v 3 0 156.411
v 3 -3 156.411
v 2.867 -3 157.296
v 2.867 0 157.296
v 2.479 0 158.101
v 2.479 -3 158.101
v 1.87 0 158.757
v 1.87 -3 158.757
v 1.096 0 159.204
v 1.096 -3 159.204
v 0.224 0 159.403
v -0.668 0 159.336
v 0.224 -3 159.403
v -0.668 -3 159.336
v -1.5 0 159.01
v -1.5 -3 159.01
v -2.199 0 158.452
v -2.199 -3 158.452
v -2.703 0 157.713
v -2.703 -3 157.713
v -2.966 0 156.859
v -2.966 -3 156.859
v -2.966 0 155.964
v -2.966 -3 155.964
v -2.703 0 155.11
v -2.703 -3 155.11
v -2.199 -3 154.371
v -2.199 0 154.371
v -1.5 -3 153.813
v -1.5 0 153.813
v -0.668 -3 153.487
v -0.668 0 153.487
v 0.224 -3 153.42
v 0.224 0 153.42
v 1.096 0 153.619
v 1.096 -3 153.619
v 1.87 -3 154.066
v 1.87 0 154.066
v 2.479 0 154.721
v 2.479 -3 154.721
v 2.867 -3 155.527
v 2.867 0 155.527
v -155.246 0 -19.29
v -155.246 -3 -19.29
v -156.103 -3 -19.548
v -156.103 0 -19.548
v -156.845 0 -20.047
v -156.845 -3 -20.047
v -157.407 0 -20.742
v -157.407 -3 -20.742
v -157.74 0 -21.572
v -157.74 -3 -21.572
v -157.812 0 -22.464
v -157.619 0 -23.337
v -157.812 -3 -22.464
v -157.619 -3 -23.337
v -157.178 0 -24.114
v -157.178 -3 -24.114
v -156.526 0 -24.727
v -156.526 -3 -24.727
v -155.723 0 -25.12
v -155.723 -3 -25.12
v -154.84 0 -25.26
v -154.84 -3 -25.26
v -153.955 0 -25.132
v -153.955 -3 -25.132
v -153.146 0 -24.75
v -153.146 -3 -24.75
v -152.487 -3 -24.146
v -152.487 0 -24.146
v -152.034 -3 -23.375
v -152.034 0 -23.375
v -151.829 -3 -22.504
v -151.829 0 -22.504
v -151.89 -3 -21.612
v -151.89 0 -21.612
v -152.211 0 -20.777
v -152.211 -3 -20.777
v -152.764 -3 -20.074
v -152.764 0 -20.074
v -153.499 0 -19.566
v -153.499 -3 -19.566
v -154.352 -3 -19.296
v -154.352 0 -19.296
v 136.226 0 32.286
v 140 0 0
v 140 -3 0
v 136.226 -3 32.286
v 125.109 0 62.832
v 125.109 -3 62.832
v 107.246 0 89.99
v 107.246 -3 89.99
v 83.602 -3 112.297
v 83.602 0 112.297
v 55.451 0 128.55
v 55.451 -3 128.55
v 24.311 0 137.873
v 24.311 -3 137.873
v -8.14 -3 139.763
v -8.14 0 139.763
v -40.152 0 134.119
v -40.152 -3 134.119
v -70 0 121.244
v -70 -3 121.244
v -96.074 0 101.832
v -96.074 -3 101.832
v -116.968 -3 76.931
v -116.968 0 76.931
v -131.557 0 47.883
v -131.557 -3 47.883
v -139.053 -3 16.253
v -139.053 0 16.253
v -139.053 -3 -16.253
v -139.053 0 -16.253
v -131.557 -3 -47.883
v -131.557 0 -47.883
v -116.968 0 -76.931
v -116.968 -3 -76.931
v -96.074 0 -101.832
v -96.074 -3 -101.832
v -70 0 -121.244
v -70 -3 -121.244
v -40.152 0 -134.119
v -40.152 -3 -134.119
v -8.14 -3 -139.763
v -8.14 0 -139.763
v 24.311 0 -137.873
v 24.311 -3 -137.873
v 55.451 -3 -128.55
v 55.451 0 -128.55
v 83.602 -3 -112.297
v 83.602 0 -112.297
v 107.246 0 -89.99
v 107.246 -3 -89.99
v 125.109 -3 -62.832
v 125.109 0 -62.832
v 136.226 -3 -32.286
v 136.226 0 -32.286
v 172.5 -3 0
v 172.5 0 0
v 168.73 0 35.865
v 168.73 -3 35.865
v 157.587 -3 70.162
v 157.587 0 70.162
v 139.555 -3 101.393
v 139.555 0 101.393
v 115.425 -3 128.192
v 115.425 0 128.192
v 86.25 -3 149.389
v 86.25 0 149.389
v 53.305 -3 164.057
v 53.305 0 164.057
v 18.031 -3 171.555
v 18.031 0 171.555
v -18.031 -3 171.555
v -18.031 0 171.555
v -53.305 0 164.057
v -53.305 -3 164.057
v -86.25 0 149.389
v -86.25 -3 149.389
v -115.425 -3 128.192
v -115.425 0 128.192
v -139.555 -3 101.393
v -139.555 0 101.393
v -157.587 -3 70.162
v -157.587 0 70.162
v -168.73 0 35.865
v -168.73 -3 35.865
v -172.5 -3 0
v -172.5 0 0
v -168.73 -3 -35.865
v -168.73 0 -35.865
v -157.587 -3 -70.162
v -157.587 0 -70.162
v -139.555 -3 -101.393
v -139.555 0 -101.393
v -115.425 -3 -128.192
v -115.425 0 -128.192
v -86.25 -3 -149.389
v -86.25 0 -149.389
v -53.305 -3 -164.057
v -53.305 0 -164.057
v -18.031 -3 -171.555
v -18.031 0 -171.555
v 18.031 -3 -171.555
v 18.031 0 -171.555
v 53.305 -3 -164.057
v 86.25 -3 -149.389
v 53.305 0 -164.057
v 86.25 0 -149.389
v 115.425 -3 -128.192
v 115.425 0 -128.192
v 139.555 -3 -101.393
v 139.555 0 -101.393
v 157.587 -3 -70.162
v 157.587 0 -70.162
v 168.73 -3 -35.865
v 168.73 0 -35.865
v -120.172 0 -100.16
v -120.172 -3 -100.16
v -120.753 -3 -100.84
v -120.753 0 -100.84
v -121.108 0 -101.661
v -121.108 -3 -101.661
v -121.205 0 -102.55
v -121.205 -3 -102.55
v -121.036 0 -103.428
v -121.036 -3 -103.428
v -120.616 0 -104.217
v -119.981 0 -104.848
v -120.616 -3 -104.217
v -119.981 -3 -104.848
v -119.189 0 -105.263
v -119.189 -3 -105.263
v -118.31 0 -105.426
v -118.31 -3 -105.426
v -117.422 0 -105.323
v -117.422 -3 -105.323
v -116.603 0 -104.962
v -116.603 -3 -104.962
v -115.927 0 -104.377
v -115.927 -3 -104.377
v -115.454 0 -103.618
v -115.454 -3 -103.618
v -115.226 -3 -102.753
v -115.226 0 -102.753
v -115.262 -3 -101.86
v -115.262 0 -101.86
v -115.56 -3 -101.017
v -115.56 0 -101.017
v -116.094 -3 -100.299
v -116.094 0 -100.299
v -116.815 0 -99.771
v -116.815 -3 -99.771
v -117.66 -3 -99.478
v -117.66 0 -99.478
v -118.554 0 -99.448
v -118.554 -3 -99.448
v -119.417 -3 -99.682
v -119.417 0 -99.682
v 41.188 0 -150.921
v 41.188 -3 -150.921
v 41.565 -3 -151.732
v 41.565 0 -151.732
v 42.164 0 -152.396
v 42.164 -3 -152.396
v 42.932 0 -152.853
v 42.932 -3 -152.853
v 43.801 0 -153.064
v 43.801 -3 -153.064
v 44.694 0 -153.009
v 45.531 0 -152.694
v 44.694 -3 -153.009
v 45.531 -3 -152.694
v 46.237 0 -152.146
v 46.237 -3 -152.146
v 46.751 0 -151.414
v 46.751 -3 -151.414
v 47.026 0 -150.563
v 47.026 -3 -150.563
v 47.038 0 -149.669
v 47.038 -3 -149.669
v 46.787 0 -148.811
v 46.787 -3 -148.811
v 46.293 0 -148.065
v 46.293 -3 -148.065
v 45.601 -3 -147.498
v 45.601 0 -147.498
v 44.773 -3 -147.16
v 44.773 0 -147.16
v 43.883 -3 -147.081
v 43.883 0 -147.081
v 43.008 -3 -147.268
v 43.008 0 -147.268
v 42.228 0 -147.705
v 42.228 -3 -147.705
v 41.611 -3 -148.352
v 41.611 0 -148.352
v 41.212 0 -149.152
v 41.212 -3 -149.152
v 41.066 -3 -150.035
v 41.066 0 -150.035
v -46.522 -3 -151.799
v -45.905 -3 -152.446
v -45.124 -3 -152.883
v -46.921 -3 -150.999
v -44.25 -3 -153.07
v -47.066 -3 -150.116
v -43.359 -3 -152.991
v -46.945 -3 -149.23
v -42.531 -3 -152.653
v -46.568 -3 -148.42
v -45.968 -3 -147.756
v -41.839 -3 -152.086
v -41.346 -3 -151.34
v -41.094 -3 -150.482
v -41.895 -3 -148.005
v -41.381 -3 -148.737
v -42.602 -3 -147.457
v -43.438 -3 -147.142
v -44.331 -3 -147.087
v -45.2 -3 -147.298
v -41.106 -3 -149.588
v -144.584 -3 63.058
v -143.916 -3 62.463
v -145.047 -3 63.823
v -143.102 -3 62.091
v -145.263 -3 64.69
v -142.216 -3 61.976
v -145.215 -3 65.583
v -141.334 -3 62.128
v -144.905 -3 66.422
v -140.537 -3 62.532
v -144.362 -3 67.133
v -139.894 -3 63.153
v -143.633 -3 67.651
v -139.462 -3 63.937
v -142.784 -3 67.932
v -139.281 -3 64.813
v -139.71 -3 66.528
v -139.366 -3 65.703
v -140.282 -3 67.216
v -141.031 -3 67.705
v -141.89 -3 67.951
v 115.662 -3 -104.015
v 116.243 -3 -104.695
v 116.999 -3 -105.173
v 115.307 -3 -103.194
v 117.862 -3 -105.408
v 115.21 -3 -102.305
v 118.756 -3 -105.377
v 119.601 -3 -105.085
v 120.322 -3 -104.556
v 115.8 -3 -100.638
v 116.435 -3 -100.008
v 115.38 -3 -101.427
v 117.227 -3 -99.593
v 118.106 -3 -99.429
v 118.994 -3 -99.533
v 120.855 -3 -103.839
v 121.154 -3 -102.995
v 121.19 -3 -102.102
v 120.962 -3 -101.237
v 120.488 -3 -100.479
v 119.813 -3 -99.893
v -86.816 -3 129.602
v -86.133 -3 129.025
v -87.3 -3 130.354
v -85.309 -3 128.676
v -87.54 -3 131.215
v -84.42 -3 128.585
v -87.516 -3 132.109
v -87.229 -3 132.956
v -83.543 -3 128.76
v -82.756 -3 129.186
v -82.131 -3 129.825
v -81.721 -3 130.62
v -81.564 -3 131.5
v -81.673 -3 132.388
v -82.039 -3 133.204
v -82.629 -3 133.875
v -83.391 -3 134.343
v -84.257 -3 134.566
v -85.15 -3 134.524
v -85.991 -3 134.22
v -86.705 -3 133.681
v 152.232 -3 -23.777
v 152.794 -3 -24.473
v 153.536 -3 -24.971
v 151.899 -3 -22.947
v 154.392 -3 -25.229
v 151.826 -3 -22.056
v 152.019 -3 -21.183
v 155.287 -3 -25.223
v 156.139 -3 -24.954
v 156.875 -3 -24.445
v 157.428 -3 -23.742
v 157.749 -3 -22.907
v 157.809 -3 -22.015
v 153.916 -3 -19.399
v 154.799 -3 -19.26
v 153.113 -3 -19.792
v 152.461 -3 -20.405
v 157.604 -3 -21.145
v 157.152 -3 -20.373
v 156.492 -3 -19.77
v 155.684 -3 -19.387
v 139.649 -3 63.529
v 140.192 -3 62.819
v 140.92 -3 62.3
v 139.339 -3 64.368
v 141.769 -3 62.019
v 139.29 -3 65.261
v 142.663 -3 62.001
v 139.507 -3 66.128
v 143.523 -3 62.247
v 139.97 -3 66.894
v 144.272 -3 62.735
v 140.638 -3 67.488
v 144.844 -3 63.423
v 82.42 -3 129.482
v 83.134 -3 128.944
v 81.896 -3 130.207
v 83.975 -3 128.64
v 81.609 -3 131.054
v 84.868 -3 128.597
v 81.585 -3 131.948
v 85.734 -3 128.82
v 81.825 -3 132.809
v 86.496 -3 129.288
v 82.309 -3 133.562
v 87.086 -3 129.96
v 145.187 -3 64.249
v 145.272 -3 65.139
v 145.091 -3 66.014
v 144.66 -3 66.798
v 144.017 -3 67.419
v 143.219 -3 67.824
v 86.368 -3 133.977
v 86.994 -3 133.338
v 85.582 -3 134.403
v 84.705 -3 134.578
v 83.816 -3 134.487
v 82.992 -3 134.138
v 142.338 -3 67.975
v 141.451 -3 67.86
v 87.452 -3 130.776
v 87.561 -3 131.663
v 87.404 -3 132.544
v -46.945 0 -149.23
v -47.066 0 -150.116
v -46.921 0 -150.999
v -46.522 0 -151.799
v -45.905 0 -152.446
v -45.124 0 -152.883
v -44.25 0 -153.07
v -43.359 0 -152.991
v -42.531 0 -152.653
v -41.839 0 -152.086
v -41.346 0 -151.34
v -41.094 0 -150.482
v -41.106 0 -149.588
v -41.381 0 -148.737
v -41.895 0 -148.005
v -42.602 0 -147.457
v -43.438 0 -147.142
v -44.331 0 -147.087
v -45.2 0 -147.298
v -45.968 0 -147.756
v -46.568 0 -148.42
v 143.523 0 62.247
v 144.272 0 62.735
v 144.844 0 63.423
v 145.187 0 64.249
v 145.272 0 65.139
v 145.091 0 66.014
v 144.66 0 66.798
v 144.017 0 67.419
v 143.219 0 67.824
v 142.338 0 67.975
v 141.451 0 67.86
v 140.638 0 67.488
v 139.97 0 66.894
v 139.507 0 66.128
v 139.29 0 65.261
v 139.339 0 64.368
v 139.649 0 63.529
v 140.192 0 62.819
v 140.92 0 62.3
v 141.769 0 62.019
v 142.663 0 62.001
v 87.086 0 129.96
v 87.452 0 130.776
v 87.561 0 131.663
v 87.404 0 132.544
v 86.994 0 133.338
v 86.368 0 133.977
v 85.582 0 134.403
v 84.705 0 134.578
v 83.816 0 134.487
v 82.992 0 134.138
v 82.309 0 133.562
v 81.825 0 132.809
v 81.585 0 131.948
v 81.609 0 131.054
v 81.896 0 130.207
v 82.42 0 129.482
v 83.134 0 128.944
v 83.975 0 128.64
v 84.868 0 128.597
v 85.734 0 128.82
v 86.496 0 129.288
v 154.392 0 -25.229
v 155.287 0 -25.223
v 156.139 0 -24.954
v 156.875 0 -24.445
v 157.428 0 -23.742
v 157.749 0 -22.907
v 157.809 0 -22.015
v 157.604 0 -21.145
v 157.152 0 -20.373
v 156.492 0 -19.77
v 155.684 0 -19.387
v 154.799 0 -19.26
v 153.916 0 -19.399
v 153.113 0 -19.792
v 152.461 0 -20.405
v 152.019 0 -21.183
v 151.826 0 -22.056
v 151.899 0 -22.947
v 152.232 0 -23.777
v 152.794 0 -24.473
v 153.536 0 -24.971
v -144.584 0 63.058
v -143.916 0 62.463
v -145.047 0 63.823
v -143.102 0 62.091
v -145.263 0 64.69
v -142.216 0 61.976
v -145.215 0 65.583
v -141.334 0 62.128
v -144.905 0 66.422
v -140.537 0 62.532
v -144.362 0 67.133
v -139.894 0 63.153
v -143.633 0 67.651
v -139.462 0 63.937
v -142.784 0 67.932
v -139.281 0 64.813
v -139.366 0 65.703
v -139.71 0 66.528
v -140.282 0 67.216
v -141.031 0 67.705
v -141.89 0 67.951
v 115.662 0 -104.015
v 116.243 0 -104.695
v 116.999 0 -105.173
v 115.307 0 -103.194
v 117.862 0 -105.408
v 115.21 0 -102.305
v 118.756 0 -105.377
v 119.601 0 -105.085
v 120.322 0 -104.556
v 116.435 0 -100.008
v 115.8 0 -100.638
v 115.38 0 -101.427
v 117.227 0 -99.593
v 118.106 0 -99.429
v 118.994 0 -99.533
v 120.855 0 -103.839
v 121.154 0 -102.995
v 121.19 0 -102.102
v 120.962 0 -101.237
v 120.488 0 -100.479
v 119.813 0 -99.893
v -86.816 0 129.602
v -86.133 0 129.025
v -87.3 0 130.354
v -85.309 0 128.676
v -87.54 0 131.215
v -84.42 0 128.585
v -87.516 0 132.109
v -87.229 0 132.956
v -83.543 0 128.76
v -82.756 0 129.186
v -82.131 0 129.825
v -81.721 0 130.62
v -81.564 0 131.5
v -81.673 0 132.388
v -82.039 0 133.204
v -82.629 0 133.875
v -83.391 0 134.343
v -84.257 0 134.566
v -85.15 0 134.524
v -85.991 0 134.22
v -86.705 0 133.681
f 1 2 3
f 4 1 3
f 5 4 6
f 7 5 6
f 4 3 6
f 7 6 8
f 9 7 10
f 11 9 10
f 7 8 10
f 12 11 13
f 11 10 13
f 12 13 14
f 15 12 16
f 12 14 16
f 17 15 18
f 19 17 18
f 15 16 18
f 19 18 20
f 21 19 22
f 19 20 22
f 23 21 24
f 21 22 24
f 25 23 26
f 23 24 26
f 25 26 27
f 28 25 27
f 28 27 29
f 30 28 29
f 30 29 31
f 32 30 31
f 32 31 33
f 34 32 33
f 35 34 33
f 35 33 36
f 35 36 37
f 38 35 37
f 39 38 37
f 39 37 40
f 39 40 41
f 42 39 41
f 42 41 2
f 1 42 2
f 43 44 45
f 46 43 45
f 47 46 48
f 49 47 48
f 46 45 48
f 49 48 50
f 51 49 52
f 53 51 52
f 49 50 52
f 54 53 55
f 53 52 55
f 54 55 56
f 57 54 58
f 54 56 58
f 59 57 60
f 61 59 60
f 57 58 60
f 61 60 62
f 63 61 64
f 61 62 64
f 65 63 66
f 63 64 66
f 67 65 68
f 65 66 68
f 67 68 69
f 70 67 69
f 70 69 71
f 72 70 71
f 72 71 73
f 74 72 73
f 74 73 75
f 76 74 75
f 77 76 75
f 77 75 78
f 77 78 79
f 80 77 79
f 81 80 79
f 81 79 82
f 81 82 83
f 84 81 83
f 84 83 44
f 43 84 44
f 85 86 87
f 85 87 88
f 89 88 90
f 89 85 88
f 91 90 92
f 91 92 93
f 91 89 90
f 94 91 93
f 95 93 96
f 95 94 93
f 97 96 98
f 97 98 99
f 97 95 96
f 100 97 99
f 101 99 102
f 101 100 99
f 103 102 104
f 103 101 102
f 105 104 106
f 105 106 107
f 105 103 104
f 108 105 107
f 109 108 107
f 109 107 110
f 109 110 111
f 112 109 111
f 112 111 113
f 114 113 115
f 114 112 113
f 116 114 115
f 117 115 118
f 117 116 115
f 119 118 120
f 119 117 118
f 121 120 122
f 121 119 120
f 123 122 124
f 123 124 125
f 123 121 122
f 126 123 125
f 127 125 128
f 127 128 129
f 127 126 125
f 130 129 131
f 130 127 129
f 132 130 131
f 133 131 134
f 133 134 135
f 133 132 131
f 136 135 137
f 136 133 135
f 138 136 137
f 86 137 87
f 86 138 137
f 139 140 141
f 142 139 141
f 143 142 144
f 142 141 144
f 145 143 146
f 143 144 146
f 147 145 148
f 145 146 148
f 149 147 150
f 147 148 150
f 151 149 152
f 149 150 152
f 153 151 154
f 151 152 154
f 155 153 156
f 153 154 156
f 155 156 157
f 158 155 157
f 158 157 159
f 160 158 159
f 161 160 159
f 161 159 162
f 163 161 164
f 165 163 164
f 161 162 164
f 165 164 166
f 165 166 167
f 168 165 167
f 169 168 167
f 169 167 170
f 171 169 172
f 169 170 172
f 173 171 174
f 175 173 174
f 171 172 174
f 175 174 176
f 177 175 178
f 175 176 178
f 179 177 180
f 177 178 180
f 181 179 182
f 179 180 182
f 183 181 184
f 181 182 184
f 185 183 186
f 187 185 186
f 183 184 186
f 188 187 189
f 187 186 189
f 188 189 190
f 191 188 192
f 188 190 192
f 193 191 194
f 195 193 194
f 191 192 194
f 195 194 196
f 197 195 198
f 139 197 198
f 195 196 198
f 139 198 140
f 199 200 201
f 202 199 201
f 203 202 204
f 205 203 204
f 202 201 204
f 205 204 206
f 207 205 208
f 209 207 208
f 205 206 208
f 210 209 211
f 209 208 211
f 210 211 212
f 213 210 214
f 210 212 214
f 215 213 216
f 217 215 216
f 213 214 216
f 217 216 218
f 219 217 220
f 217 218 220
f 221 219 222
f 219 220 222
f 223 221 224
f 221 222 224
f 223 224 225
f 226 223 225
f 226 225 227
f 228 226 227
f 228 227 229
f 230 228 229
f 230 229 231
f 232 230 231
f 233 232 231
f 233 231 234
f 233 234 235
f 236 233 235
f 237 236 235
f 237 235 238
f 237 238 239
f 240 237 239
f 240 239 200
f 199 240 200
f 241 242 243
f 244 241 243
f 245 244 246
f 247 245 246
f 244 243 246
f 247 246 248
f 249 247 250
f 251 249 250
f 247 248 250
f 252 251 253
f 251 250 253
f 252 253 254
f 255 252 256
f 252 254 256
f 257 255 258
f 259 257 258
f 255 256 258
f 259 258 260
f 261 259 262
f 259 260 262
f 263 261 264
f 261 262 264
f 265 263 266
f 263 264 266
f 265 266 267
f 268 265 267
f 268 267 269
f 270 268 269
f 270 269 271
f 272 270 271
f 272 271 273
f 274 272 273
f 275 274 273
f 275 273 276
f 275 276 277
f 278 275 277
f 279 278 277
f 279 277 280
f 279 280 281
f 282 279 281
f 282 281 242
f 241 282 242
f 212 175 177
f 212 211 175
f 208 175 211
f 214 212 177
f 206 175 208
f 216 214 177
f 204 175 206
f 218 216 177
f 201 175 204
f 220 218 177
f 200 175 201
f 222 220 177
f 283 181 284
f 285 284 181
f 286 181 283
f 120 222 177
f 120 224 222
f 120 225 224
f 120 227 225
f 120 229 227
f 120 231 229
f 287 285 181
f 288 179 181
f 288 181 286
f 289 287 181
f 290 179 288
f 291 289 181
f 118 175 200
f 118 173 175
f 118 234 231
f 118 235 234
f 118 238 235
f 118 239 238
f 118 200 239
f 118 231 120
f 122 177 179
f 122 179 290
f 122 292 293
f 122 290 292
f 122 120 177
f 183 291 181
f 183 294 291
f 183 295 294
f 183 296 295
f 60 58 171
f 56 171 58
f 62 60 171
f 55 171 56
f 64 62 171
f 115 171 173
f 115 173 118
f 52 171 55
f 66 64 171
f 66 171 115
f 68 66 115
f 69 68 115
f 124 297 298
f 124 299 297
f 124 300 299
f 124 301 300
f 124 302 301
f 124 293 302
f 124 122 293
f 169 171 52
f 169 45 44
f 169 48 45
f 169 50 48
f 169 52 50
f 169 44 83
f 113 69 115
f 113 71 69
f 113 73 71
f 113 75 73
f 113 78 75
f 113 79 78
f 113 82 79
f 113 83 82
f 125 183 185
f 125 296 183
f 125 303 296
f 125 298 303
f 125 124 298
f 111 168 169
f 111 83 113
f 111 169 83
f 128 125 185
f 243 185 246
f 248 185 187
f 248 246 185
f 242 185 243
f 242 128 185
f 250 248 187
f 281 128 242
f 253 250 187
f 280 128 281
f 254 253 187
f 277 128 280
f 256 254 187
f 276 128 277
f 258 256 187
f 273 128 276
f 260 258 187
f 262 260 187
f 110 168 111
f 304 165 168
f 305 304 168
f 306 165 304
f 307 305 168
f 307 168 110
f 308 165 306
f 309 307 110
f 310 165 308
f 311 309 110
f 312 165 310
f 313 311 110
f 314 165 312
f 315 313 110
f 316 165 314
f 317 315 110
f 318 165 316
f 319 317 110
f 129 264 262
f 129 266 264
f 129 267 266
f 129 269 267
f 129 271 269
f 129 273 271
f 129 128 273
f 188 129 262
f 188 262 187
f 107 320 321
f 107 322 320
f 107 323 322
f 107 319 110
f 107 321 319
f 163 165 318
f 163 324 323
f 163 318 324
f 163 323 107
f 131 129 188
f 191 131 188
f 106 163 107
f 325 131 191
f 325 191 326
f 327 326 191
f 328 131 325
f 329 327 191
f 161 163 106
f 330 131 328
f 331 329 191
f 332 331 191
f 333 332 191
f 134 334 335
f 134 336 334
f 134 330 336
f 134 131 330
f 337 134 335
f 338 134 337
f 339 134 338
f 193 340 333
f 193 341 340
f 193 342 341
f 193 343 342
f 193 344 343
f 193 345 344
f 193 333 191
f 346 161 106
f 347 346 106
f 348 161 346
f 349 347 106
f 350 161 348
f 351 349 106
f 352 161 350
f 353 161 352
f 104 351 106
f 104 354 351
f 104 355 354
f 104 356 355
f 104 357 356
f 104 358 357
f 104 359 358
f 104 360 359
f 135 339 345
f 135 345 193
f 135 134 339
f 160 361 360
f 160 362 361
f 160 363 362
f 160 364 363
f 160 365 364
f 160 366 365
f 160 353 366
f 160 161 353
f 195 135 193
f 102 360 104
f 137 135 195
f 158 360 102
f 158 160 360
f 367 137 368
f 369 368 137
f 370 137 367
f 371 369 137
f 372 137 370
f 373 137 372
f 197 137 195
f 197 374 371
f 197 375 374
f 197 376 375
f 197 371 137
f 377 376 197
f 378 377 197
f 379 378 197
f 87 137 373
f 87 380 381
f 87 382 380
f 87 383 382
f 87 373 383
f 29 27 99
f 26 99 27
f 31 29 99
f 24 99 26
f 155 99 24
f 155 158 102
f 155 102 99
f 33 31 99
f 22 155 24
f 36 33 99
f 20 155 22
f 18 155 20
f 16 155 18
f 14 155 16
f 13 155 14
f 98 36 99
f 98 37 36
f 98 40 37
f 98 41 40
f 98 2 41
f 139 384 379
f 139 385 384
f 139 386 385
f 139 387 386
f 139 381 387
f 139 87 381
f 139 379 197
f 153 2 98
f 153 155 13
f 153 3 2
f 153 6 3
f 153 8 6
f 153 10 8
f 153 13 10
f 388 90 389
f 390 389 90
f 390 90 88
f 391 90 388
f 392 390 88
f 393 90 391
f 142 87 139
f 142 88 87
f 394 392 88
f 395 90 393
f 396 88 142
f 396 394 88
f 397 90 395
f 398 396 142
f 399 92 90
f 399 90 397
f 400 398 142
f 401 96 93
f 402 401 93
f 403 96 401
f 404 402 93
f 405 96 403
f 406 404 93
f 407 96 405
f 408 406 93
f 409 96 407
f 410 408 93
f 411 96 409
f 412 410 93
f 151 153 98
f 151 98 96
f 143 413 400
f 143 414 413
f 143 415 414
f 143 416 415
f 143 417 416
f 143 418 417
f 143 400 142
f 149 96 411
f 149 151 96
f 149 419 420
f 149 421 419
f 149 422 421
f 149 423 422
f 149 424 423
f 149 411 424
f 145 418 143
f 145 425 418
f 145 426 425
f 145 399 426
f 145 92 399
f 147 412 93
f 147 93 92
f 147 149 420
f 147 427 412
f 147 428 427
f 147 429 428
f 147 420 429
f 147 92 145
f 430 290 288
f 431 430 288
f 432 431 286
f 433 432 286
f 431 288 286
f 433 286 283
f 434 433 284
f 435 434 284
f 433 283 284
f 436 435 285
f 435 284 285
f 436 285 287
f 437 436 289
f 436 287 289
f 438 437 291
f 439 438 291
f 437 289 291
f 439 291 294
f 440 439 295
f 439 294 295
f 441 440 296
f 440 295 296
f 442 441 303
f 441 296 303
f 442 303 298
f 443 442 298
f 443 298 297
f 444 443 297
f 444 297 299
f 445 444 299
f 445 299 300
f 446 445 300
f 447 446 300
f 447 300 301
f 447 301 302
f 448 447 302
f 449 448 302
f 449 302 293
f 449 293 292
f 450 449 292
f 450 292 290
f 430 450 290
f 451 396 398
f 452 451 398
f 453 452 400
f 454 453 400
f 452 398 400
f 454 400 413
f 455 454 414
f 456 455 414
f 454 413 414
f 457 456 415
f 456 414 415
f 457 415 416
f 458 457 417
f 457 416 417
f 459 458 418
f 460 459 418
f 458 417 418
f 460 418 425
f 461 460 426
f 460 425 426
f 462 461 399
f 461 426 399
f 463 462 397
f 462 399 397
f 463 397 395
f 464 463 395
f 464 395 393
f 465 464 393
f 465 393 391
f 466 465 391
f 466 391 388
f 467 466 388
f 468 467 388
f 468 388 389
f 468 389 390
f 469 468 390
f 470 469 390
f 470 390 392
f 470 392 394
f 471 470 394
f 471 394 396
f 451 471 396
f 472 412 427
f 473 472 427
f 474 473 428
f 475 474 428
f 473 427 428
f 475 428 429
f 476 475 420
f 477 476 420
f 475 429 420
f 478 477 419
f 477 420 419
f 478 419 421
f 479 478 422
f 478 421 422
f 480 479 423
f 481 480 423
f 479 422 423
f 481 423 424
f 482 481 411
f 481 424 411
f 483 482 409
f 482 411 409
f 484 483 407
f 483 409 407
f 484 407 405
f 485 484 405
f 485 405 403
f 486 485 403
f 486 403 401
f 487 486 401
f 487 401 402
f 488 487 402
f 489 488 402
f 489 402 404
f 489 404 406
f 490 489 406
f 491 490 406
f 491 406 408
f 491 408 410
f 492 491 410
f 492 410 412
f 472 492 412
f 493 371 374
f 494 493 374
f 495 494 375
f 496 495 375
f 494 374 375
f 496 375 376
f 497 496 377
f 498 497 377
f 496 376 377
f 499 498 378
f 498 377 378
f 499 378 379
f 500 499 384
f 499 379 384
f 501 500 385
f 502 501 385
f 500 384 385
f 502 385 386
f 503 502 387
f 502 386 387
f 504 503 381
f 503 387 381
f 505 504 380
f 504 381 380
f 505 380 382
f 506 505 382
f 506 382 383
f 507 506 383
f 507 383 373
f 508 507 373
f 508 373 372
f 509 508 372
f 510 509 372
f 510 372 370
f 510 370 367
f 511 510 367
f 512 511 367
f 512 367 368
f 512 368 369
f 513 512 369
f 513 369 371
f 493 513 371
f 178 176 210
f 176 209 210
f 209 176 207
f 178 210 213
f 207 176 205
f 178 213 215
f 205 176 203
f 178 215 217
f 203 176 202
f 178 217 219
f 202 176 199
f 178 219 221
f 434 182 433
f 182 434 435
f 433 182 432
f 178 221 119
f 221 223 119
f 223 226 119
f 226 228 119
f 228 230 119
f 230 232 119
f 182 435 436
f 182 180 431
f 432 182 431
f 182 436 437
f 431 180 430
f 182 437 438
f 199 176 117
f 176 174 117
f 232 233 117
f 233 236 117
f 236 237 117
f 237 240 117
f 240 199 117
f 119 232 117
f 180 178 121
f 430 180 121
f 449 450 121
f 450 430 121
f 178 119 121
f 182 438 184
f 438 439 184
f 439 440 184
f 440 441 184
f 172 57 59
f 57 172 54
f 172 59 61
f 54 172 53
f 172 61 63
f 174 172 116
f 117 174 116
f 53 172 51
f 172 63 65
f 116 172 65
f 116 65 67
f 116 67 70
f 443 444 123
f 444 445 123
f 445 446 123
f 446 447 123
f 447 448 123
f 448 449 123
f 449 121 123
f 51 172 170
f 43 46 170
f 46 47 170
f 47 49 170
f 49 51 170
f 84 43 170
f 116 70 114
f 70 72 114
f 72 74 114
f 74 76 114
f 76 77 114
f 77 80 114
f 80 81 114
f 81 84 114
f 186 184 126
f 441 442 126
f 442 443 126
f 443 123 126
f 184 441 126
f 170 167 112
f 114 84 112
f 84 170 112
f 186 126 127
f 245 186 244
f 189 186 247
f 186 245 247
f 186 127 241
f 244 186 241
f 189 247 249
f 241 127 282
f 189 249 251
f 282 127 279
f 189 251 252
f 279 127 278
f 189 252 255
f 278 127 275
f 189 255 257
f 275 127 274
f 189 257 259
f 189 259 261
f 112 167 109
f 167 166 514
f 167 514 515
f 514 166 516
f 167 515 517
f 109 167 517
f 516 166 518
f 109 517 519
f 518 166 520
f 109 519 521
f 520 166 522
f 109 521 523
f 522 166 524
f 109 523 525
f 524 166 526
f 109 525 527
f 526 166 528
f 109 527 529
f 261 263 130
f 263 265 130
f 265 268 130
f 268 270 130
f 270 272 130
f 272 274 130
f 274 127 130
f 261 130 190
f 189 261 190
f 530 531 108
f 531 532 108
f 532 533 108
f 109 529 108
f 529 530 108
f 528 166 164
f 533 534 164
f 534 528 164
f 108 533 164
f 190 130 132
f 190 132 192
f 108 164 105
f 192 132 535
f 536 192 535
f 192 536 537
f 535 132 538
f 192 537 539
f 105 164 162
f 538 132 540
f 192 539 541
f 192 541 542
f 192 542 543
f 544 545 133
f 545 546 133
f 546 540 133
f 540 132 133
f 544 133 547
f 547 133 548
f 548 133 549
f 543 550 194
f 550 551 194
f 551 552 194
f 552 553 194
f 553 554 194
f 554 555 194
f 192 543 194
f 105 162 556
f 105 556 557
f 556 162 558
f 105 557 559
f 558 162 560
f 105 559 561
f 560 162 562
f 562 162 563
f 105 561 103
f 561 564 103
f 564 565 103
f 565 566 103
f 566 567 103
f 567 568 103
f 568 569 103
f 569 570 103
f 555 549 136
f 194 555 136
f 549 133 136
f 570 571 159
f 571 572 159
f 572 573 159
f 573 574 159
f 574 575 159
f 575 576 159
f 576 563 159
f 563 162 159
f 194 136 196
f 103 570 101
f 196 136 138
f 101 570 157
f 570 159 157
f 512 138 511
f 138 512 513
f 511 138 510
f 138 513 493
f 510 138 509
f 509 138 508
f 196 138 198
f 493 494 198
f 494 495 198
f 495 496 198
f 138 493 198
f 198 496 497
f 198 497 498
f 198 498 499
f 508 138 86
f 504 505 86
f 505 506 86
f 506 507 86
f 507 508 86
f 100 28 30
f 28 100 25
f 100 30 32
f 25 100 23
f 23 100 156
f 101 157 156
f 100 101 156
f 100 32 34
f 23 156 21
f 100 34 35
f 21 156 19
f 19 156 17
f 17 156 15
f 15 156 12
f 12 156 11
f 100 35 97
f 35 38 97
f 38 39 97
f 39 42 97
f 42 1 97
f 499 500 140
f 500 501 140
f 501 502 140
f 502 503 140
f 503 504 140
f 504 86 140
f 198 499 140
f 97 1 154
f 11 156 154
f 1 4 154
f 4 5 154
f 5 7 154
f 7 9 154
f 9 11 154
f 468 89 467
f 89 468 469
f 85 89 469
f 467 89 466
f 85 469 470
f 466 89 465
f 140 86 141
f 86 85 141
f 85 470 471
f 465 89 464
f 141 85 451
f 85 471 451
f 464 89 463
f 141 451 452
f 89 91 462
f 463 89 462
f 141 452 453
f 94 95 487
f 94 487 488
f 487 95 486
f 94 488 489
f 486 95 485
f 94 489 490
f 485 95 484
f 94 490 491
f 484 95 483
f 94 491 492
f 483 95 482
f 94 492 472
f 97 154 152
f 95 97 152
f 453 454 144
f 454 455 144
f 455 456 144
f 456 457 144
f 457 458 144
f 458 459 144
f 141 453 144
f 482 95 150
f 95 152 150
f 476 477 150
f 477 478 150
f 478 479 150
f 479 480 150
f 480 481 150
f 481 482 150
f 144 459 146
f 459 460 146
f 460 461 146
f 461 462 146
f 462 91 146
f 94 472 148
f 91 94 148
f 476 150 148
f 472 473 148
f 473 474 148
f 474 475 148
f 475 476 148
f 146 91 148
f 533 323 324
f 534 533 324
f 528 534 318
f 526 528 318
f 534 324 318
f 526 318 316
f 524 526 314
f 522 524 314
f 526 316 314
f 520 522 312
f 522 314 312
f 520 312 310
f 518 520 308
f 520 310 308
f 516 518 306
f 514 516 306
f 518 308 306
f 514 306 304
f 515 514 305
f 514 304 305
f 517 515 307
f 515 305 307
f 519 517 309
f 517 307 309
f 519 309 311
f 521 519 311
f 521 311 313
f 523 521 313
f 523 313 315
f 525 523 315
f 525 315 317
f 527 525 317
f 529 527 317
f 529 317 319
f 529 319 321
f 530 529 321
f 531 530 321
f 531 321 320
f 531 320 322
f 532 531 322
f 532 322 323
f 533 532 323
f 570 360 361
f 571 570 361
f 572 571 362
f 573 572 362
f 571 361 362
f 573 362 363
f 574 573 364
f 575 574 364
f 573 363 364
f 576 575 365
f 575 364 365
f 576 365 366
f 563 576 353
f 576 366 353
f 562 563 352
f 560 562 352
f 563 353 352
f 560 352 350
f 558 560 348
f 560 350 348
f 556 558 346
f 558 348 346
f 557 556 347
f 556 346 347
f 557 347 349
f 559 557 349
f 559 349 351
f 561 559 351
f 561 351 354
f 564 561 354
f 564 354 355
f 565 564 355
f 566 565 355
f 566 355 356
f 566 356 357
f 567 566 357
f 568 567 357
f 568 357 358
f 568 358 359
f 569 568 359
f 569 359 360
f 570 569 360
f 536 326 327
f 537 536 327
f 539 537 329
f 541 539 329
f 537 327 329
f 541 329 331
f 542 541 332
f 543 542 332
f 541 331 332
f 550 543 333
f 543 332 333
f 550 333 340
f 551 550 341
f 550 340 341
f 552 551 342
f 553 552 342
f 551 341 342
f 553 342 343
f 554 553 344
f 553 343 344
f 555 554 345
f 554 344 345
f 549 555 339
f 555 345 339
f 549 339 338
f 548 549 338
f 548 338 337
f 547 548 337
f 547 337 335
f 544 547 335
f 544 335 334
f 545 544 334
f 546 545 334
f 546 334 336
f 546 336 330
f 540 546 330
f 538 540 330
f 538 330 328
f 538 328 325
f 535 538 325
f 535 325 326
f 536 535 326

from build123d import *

# Parameters (mm, degrees)
F0_R            = 172.5
F0_R_2          = 140
F1_DEPTH        = 3
F2_R            = 3
F3_DEPTH        = 25
F3_COPIES_COUNT = 11


# Not quite as in the source:
# - a pattern or mirror of a feature is missing from the dataset's text; its kind, count and spacing are read off the source's solid


with BuildPart() as f1:
    # F0 (on Front) → F1 (new body)
    with BuildSketch(Plane.XZ):
        Circle(F0_R)
        Circle(F0_R_2, mode=Mode.SUBTRACT)
    extrude(amount=F1_DEPTH)

    # F2 (on face) → F3 (cut)
    with BuildSketch(Plane.XZ.offset(3)):
        with Locations((0, 156.4114242792)):
            Circle(F2_R)
    f3 = extrude(amount=-F3_DEPTH, mode=Mode.SUBTRACT)

    # F3_copies: F3 ×11 about axis
    f3_copies_axis = Axis((0, 0, 0), (0, 1, 0))
    for i in range(1, F3_COPIES_COUNT):
        add(f3.rotate(f3_copies_axis, i * 360 / F3_COPIES_COUNT), mode=Mode.SUBTRACT)


solid = f1.part
